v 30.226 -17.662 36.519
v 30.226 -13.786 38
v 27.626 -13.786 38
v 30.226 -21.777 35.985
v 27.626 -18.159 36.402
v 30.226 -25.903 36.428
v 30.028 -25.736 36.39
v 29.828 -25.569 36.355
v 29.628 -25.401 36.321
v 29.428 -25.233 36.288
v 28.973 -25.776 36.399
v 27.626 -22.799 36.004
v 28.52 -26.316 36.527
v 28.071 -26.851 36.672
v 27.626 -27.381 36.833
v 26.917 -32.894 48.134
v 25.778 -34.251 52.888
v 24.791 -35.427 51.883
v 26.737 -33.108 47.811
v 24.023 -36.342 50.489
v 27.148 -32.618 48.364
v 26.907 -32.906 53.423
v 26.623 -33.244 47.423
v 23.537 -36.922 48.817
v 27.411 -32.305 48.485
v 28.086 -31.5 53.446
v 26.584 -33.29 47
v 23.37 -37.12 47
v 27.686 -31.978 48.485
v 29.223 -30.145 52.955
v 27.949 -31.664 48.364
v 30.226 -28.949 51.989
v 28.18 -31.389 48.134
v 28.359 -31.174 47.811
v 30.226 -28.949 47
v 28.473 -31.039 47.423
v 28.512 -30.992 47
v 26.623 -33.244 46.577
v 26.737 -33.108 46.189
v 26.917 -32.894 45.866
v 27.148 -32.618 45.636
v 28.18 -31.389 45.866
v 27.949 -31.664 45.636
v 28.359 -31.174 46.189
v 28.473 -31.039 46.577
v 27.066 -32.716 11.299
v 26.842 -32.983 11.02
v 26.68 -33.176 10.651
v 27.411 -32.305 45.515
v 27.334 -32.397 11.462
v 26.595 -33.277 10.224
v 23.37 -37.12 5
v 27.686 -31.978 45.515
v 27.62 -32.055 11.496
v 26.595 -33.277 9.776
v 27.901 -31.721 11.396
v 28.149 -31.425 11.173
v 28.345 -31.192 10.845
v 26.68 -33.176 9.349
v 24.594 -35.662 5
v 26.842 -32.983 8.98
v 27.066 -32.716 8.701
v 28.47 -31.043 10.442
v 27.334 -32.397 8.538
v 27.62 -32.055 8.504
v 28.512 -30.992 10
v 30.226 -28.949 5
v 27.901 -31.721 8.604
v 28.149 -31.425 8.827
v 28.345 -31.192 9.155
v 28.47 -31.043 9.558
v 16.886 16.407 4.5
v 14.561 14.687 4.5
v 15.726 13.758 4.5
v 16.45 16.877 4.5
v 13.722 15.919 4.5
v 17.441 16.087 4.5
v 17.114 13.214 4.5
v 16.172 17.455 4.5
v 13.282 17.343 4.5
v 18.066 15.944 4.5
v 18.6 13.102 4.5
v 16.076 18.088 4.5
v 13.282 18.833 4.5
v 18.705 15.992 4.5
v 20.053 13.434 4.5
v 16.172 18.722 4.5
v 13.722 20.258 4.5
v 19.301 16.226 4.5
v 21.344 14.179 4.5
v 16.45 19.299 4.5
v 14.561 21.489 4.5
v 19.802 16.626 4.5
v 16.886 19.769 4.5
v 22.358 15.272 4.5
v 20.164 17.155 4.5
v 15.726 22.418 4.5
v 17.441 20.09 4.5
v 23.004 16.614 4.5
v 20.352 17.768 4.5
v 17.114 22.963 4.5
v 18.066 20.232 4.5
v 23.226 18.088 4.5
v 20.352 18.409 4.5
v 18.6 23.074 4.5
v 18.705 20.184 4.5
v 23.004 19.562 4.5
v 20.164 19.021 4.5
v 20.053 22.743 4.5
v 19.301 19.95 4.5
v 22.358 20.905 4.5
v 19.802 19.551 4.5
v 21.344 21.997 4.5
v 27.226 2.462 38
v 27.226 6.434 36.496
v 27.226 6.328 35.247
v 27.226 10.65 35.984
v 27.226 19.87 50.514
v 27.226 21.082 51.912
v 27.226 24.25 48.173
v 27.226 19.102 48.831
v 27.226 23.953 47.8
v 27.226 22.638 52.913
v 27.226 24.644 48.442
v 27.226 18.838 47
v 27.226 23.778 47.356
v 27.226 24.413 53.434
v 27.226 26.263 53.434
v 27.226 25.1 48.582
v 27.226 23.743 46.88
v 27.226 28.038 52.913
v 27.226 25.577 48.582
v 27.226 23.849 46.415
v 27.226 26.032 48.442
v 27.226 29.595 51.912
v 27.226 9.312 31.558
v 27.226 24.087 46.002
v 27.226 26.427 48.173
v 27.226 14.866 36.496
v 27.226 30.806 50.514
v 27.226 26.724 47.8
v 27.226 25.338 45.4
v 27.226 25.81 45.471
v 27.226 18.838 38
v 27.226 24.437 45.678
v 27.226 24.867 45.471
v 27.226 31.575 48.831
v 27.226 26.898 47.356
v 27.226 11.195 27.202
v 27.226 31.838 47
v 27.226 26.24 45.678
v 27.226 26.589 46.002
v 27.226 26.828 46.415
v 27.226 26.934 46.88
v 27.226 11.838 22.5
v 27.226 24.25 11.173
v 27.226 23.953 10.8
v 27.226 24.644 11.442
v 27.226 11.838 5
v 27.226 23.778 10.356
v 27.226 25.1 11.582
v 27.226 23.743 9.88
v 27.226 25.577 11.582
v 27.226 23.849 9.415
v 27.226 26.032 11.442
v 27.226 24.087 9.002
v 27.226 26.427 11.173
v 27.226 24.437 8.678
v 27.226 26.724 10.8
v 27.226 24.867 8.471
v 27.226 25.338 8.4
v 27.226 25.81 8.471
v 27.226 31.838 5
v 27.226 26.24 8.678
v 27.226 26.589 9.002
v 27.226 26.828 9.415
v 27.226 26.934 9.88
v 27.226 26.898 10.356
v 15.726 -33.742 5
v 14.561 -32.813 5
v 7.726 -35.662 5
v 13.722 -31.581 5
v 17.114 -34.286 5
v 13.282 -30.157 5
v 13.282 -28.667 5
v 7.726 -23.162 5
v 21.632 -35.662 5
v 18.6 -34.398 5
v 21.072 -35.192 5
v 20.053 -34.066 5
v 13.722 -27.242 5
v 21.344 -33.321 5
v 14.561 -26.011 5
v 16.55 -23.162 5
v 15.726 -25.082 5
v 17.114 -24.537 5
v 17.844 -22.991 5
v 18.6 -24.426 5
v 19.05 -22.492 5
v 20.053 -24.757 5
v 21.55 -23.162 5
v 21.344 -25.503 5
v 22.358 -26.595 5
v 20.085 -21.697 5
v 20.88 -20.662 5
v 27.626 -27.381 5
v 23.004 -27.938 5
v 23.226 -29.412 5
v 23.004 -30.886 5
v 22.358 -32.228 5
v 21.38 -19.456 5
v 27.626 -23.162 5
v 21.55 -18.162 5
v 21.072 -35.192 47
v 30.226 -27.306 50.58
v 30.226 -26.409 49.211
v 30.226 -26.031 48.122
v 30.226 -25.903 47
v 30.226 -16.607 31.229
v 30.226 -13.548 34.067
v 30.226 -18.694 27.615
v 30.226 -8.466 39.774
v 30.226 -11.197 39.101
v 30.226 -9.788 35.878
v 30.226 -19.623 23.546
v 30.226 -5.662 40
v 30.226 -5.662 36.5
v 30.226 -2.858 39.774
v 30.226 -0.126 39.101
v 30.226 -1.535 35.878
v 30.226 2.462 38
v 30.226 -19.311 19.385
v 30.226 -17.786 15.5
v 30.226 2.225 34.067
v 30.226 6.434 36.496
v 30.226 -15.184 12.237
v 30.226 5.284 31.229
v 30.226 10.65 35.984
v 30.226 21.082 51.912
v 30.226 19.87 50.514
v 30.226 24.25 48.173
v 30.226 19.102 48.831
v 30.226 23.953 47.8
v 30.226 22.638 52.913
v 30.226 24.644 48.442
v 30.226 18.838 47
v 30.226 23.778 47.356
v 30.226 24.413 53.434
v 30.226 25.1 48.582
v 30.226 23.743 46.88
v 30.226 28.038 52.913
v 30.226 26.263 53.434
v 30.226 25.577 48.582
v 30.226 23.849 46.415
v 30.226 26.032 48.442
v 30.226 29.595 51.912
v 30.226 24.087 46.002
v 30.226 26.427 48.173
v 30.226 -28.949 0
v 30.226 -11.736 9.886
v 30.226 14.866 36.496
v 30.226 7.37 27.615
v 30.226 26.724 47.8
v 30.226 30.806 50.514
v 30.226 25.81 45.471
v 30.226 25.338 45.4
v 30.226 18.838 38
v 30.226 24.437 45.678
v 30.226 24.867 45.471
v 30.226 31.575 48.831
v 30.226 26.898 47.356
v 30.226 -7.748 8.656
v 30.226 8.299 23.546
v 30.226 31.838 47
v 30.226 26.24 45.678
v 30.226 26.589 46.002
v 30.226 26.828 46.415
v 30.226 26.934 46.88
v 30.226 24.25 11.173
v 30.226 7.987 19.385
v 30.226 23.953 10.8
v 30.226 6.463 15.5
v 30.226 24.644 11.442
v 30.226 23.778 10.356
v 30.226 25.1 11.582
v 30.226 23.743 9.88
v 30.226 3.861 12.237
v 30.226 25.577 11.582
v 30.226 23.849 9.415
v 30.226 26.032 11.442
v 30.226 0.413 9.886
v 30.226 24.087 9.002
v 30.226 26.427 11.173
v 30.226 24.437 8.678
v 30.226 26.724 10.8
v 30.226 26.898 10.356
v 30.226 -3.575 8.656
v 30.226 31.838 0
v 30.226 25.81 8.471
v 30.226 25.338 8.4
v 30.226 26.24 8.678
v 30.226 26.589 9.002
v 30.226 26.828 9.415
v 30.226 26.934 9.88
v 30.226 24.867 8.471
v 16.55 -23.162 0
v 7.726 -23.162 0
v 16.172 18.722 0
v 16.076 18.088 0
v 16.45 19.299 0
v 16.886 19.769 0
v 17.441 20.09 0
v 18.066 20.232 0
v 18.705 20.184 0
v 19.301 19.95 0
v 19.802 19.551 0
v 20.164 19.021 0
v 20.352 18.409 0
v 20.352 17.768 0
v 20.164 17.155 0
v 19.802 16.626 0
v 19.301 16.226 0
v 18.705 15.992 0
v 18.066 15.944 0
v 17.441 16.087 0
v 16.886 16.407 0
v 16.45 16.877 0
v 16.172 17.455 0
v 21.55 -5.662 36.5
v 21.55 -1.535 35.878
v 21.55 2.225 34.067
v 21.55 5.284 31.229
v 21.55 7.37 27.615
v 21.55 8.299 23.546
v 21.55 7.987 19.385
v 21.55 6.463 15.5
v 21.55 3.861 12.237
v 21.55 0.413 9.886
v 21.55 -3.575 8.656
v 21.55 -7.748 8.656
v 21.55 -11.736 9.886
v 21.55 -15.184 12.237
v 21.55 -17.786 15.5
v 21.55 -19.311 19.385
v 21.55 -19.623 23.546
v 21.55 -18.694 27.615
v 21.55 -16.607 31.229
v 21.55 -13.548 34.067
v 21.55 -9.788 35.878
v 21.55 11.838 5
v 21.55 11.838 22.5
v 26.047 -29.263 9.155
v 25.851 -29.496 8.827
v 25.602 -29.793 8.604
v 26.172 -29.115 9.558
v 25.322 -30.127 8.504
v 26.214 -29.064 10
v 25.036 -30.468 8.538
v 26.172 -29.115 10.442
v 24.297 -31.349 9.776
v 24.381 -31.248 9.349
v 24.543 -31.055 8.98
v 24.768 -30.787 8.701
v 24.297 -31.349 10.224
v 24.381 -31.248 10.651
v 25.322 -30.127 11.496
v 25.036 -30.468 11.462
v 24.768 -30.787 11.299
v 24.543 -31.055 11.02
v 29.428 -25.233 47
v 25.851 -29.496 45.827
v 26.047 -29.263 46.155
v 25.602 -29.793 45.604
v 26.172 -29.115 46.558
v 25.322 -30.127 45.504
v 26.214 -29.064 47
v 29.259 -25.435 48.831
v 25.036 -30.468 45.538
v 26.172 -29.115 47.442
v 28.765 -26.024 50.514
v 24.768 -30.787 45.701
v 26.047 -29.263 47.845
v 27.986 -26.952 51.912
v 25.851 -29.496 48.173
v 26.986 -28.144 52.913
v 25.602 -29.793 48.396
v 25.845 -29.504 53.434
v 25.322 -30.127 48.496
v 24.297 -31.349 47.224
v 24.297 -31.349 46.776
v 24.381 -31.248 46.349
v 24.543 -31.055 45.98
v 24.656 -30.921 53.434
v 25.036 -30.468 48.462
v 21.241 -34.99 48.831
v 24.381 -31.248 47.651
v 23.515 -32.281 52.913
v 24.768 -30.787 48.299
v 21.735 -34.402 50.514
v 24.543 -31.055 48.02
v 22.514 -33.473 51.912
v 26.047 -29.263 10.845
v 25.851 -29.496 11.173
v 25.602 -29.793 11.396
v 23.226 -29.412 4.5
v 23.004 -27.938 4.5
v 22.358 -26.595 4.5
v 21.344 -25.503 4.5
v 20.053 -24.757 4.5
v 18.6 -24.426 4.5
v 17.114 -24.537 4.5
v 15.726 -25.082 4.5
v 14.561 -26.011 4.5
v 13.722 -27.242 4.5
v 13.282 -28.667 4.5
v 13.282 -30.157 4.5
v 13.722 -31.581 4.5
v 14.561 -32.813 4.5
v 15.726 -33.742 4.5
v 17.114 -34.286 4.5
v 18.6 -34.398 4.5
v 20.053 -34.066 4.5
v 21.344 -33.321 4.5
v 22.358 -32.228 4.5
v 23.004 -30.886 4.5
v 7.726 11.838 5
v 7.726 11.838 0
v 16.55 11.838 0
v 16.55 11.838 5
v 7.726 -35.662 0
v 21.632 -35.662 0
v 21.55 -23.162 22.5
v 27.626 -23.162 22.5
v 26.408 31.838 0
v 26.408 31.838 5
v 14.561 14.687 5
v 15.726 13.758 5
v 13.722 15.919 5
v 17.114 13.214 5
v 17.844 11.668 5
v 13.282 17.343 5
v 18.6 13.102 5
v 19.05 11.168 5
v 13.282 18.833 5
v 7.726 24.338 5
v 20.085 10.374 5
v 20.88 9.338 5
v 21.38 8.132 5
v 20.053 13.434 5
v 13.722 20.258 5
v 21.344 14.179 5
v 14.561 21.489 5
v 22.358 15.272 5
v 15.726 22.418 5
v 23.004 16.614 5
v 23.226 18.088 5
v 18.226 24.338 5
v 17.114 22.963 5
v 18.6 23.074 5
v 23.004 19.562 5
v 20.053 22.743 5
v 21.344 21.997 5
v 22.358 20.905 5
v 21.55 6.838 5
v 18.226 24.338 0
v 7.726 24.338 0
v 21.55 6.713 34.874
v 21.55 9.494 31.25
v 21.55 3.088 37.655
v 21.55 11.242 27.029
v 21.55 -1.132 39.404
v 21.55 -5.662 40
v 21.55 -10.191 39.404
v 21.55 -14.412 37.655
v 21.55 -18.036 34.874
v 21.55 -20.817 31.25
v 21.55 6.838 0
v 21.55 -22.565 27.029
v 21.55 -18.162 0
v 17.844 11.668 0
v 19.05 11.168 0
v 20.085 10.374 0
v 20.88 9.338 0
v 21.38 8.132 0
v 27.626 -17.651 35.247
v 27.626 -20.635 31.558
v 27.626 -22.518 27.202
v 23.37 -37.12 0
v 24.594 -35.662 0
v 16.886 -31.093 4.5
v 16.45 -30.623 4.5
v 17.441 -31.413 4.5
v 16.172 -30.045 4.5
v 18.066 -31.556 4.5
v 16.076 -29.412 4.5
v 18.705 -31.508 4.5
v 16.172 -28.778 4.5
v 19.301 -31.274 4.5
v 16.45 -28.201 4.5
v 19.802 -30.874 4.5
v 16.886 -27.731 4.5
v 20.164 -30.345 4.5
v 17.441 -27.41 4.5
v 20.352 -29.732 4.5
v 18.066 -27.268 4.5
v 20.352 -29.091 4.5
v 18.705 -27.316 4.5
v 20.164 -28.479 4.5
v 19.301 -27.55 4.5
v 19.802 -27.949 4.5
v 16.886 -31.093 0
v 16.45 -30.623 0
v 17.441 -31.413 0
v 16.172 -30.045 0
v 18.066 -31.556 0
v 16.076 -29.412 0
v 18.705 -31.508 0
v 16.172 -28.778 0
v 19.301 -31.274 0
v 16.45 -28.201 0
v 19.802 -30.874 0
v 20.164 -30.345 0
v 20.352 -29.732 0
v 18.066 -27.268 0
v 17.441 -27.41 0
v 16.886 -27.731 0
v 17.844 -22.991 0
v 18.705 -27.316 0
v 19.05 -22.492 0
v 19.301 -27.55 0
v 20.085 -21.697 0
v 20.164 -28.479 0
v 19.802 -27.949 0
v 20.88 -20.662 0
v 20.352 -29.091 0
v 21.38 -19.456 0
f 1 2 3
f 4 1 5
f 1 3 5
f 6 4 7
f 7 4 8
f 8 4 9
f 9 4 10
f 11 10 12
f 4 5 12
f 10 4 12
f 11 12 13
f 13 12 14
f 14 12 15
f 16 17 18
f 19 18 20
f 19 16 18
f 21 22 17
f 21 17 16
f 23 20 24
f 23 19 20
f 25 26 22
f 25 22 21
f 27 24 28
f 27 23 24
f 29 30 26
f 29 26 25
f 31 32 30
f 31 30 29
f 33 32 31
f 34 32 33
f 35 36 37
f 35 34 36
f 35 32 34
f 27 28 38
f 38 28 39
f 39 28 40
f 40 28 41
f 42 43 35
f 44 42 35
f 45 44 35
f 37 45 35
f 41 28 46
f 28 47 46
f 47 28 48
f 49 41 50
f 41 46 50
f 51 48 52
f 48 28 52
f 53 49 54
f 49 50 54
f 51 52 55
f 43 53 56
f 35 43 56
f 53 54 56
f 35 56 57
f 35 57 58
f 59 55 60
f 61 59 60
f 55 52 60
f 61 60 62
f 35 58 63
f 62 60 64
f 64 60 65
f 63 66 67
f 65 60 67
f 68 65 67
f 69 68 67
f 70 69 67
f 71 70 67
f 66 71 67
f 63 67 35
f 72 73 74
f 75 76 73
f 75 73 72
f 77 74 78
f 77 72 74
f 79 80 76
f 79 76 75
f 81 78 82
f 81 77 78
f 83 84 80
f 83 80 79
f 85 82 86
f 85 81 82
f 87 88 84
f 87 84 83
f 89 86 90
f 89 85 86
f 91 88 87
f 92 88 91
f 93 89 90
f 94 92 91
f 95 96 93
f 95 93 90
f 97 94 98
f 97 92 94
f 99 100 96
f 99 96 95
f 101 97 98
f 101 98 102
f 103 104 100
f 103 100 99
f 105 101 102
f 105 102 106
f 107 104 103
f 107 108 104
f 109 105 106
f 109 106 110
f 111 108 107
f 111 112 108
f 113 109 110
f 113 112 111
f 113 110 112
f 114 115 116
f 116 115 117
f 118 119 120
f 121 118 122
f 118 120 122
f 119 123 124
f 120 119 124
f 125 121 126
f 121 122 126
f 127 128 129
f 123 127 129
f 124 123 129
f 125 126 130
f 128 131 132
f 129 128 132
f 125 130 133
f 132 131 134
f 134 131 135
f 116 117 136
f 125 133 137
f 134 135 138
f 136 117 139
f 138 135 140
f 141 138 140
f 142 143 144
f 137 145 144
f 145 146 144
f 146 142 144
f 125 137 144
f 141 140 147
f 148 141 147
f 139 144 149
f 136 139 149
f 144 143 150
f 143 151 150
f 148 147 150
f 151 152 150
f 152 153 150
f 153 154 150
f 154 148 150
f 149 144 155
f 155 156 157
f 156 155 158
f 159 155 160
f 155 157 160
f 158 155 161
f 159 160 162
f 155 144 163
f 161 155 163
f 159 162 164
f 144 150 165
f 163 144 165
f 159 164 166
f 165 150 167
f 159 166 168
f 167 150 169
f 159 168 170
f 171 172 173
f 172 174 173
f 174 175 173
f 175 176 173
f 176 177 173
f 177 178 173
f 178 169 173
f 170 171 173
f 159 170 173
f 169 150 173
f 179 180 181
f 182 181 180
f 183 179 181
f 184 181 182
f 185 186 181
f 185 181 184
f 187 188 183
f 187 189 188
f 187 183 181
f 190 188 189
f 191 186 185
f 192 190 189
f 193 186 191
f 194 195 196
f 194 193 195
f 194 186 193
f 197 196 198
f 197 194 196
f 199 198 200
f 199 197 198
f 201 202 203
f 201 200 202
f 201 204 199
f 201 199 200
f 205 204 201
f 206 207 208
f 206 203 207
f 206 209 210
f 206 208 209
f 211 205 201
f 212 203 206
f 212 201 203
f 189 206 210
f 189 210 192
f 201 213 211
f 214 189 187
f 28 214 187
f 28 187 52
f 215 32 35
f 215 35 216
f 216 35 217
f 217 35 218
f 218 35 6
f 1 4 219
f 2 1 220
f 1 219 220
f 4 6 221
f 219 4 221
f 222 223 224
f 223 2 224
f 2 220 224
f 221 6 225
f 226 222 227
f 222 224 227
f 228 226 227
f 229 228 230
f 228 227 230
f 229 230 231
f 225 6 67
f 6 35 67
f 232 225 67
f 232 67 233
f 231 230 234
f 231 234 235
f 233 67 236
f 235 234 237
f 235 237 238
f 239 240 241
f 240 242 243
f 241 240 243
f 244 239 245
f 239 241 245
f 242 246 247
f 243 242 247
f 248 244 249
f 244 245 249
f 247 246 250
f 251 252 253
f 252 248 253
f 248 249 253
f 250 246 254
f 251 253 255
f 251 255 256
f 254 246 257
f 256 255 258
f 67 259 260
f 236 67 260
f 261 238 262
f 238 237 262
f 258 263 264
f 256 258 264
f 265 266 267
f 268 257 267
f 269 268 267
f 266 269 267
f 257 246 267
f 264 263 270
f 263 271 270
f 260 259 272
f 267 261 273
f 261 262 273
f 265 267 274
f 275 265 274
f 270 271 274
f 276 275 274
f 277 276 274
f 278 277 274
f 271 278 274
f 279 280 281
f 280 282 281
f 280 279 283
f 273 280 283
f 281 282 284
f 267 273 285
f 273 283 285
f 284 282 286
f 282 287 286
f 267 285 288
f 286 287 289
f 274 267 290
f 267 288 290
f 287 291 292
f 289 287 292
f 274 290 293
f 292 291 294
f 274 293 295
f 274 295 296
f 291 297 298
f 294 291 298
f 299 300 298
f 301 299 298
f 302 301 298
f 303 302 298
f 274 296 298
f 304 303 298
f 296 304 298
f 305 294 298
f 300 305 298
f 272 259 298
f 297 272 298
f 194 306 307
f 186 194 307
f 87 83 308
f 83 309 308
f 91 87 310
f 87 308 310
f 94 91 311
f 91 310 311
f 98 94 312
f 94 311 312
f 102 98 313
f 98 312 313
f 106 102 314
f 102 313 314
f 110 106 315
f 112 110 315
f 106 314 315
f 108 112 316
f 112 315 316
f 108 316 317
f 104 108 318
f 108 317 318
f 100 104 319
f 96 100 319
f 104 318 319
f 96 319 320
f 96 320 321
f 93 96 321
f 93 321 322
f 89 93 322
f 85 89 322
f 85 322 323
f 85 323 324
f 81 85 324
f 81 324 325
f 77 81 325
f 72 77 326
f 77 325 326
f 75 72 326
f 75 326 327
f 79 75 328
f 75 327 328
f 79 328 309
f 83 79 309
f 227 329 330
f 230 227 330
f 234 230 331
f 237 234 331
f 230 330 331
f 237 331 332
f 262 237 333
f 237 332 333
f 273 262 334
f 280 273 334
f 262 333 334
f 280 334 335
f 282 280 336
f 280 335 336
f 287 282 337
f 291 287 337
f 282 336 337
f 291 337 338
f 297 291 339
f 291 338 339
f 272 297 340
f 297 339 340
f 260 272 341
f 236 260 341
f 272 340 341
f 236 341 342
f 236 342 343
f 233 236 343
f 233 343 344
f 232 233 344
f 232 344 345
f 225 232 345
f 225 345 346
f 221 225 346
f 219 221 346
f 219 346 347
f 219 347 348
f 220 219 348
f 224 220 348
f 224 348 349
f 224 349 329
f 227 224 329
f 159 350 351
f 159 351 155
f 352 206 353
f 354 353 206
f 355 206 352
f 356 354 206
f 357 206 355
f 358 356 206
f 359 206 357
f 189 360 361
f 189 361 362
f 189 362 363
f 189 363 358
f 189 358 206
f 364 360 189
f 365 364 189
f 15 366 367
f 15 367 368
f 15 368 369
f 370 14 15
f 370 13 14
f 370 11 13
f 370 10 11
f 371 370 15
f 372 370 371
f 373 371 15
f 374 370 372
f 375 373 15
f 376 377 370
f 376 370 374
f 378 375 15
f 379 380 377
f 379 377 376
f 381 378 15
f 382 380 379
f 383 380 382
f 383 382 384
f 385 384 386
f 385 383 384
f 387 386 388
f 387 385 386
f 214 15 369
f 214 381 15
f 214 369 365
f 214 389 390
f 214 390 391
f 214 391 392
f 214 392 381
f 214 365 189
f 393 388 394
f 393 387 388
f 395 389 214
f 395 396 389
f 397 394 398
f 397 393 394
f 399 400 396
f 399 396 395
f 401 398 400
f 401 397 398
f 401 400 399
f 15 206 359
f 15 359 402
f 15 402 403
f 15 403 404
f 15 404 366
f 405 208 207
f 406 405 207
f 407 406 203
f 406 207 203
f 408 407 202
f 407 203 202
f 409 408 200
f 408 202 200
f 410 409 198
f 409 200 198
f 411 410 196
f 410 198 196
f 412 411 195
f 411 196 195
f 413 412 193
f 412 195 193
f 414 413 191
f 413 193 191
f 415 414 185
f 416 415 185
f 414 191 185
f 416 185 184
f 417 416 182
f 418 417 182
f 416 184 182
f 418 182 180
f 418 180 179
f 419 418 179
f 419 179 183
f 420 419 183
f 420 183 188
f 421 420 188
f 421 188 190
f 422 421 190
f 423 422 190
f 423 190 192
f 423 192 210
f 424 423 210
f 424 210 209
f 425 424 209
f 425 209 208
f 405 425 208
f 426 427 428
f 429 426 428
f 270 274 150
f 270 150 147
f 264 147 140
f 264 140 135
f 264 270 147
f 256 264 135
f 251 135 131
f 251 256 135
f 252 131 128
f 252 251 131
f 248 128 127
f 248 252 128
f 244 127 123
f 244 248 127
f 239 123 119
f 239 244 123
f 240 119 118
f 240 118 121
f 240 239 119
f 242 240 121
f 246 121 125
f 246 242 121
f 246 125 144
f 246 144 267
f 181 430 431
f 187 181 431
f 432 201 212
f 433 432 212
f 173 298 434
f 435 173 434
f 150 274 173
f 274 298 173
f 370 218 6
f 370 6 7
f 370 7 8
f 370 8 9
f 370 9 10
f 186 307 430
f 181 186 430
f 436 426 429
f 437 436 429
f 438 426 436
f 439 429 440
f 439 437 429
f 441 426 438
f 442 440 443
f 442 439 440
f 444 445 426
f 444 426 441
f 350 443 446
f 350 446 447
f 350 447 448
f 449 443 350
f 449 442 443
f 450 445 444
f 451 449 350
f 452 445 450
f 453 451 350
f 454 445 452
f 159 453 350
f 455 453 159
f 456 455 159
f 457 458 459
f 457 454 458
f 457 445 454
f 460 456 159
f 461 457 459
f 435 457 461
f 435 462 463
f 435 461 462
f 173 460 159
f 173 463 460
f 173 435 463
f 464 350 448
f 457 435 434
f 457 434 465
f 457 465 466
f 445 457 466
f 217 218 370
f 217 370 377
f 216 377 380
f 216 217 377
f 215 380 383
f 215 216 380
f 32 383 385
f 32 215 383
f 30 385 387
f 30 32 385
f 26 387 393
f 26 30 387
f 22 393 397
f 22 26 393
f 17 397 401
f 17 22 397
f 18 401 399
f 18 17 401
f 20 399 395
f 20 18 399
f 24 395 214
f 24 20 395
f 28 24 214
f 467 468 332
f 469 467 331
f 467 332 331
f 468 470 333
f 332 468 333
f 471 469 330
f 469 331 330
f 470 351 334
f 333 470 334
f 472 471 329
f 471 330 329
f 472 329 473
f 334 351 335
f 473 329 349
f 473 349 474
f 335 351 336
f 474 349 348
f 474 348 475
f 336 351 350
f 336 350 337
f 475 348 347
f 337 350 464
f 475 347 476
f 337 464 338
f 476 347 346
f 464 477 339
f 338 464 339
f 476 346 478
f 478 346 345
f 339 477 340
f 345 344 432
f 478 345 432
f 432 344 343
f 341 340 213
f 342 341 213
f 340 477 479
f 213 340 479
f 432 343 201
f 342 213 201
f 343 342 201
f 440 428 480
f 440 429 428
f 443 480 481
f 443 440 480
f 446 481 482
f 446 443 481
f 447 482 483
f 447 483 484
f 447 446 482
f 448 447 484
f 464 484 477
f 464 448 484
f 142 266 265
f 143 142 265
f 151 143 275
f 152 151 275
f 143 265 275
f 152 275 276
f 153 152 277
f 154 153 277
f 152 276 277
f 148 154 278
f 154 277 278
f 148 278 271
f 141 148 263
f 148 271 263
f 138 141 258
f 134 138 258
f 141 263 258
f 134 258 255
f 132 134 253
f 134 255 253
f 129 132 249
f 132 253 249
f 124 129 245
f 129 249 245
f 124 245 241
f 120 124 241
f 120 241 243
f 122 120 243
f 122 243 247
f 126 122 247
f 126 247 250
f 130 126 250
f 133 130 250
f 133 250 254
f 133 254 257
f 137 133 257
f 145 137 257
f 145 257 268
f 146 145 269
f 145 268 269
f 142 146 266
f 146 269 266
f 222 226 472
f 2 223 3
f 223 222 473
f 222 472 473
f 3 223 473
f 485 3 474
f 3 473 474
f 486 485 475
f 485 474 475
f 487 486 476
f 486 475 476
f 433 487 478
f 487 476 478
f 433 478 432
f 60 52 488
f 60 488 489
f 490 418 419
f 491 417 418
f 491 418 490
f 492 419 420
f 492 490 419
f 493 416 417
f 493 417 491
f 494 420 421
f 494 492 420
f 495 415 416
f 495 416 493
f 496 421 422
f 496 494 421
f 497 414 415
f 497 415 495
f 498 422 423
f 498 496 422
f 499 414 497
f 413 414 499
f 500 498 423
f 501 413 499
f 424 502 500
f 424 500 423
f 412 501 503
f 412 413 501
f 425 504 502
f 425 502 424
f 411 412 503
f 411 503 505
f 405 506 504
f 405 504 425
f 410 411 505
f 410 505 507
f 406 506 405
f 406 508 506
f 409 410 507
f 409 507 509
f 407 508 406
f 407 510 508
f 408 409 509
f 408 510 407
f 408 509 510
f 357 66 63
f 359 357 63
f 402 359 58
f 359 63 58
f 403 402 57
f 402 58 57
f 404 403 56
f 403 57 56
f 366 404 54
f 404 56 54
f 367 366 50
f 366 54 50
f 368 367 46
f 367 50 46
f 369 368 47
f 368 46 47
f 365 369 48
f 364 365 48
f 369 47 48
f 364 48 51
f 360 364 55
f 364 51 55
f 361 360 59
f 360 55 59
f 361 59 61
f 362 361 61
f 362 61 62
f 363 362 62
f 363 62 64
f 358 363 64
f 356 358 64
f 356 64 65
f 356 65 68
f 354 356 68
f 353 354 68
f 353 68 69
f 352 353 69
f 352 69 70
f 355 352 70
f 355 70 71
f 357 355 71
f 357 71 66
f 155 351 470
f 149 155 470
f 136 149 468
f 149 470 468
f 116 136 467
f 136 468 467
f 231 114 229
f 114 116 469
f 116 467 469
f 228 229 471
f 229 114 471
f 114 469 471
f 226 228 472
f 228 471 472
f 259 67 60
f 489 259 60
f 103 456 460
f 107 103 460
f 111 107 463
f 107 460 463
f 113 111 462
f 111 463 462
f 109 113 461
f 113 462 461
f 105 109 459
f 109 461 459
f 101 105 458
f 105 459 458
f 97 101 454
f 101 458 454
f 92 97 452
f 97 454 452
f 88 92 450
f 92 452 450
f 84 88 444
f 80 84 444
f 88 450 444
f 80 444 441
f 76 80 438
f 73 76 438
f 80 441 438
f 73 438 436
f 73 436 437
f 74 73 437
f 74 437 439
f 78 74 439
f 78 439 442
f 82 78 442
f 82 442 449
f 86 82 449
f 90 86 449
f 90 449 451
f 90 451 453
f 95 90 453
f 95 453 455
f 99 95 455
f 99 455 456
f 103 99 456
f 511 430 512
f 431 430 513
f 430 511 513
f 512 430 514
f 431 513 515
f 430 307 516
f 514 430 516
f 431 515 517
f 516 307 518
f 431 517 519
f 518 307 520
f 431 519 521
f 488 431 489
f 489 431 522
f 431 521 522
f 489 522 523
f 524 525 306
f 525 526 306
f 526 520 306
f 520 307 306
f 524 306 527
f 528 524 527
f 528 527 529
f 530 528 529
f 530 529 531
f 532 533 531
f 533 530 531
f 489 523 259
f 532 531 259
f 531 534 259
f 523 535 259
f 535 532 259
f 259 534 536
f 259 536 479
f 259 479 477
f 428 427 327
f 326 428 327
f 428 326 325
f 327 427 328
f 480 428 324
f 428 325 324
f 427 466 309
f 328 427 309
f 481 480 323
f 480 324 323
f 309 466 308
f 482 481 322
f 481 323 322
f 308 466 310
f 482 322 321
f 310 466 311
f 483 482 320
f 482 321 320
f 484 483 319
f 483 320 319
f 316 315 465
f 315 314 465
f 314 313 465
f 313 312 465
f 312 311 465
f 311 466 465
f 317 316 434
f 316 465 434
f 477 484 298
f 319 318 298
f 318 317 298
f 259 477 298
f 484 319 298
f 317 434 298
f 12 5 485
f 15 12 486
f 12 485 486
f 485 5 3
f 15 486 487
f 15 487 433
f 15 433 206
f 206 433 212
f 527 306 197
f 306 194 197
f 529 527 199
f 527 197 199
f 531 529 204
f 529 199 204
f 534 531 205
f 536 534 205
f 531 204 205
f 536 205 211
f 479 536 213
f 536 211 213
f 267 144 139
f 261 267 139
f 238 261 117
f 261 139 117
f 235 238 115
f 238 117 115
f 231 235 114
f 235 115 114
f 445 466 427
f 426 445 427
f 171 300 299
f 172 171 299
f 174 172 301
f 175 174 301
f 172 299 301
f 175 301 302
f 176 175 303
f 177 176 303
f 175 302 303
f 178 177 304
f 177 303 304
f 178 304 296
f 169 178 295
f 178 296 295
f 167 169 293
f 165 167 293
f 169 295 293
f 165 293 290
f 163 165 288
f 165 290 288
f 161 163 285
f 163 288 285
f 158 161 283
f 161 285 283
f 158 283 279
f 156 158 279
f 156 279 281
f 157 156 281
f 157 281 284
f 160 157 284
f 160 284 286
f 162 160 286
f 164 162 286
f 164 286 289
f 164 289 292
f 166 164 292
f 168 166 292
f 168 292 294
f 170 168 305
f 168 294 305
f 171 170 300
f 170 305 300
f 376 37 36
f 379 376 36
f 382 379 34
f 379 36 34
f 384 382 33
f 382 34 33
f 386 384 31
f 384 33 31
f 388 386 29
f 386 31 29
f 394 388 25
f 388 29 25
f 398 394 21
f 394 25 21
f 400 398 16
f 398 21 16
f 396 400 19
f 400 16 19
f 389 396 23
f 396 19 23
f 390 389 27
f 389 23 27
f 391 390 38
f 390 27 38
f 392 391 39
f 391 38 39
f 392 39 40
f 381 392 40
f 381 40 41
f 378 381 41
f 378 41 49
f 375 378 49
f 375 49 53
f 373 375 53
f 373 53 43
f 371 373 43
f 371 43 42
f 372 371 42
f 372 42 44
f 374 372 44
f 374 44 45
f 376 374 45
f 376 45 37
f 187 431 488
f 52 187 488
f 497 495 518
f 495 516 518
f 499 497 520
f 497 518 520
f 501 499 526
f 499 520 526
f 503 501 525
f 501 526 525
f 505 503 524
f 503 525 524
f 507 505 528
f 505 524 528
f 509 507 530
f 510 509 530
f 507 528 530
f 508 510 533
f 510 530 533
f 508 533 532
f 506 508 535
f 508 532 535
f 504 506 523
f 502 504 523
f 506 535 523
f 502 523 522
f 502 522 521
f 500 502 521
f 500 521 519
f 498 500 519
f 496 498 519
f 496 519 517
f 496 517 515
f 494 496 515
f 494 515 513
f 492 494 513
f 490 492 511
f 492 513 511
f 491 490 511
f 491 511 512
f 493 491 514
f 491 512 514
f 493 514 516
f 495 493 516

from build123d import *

# Parameters (mm, degrees)
EXTRUDE_2_DEPTH                = 5
SKETCH_4_W                     = 8.676470589
SKETCH_4_H                     = 35
SKETCH_4_W_2                   = 8.676470588
EXTRUDE_15_DEPTH               = 35
CUT_EXTRUDE_1_DEPTH            = 45
SKETCH_6_R                     = 14
CUT_EXTRUDE_2_DEPTH            = 45
FILLET_1_R                     = 5
SKETCH_7_R                     = 15
SKETCH_7_R_2                   = 13
EXTRUDE_16_DEPTH               = 1
SPLIT_BODIES_1_SURFACE_1_BACK  = 86
SPLIT_BODIES_1_SURFACE_1_DEPTH = 172
SPLIT_BODIES_1_SURFACE_2_BACK  = 86
SPLIT_BODIES_1_SURFACE_2_DEPTH = 172
HOLE_WIZARD_1_D                = 4.3
HOLE_WIZARD_1_DEPTH            = 5
HOLE_WIZARD_1_CBORE_D          = 10
HOLE_WIZARD_1_CBORE_DEPTH      = 0.5
HOLE_WIZARD_1_TIP              = 1.291850331
SKETCH_17_W                    = 3
SKETCH_17_H                    = 13
EXTRUDE_20_DEPTH               = 42
EXTRUDE_21_DEPTH               = 3
SKETCH_19_R                    = 1.6
CUT_EXTRUDE_3_DEPTH            = 3
EXTRUDE_START                  = -3
EXTRUDE_25_DEPTH               = 3
EXTRUDE_22_DEPTH               = 5
EXTRUDE_26_DEPTH               = 42
EXTRUDE_START_2                = -2.6
EXTRUDE_27_DEPTH               = 2.6
CUT_EXTRUDE_5_DEPTH            = 22.6
EXTRUDE_29_REACH               = 85.035
SKETCH_42_R                    = 1.5
CUT_EXTRUDE_6_DEPTH            = 84.034846606
CUT_EXTRUDE_7_DEPTH            = 8.6
EXTRUDE_31_DEPTH               = 5


with BuildPart() as part:
    # 草图2 → 凸台-拉伸2 (new body)
    with BuildSketch(Plane.XY):
        Polygon((7.726423565, 24.338235294), (-14.773576435, 24.338235294), (-14.773576435, -35.661764706), (7.726423565, -35.661764706), (7.726423565, -23.161764706), (-6.097105846, -23.161764706), (-6.097105846, 11.838235294), (7.726423565, 11.838235294), align=None)
        Polygon((30.226423565, 24.338235294), (7.726423565, 24.338235294), (7.726423565, 11.838235294), (21.549952977, 11.838235294), (21.549952977, -23.161764706), (7.726423565, -23.161764706), (7.726423565, -35.661764706), (30.226423565, -35.661764706), align=None)
    extrude(amount=EXTRUDE_2_DEPTH)

    # 草图4 → 凸台-拉伸15 (add)
    with BuildSketch(Plane.XY.offset(5)):
        with Locations((-10.435341141, -5.661764706)):
            Rectangle(SKETCH_4_W, SKETCH_4_H)
        with Locations((25.888188271, -5.661764706)):
            Rectangle(SKETCH_4_W_2, SKETCH_4_H)
    extrude(amount=EXTRUDE_15_DEPTH)

    # 草图5 → 切除-拉伸1 (cut)
    with BuildSketch(Plane.ZY.offset(14.773576435)):
        with BuildLine():
            Line((40, -23.161764706), (40, -5.661764706))
            ThreePointArc((40, -5.661764706), (34.874368671, -18.036133377), (22.5, -23.161764706))
            Line((22.5, -23.161764706), (40, -23.161764706))
        make_face()
        with BuildLine():
            ThreePointArc((22.5, 11.838235294), (34.874368671, 6.712603965), (40, -5.661764706))
            Line((40, -5.661764706), (40, 11.838235294))
            Line((40, 11.838235294), (22.5, 11.838235294))
        make_face()
    extrude(amount=-CUT_EXTRUDE_1_DEPTH, mode=Mode.SUBTRACT)

    # 草图6 → 切除-拉伸2 (cut)
    with BuildSketch(Plane.ZY.offset(14.773576435)):
        with Locations((22.5, -5.661764706)):
            Circle(SKETCH_6_R)
    extrude(amount=-CUT_EXTRUDE_2_DEPTH, mode=Mode.SUBTRACT)

    # 圆角1
    fillet_1_edges = [part.edges().sort_by_distance(p)[0] for p in [
        (-6.097105846, 11.838235294, 2.5),
        (-6.097105846, -23.161764706, 2.5),
        (21.549952977, -23.161764706, 2.5),
        (21.549952977, 11.838235294, 2.5),
    ]]
    fillet(fillet_1_edges, radius=FILLET_1_R)

    # 草图7 → 凸台-拉伸16 (add)
    with BuildSketch(Plane(origin=(-6.097105846, 0, 0), x_dir=(0, 0, -1), z_dir=(1, 0, 0))):
        with Locations((-22.5, -5.661764706)):
            Circle(SKETCH_7_R)
        with Locations((-22.5, -5.661764706)):
            Circle(SKETCH_7_R_2, mode=Mode.SUBTRACT)
    extrude(amount=-EXTRUDE_16_DEPTH)


with BuildPart() as body_2:
    # Split Bodies 1: the piece behind the surface
    add(part.part)
    # Split Bodies 1 surface: a surface, the sketch's curves swept straight by 172 mm
    with BuildLine(Plane.XY.offset(5).offset(-SPLIT_BODIES_1_SURFACE_1_BACK), mode=Mode.PRIVATE) as split_bodies_1_surface_1_path:
        Line((7.726423565, 24.338235294), (7.726423565, -35.661764706))
    split_bodies_1_surface_1 = Shell.extrude(split_bodies_1_surface_1_path.wire(), (0 * SPLIT_BODIES_1_SURFACE_1_DEPTH, 0 * SPLIT_BODIES_1_SURFACE_1_DEPTH, 1 * SPLIT_BODIES_1_SURFACE_1_DEPTH))
    split(bisect_by=split_bodies_1_surface_1, keep=Keep.BOTTOM)


with BuildPart() as part_1:
    add(part.part)

    # Split Bodies 1: split by a surface, the side it looks to stays
    # Split Bodies 1 surface: a surface, the sketch's curves swept straight by 172 mm
    with BuildLine(Plane.XY.offset(5).offset(-SPLIT_BODIES_1_SURFACE_2_BACK), mode=Mode.PRIVATE) as split_bodies_1_surface_2_path:
        Line((7.726423565, 24.338235294), (7.726423565, -35.661764706))
    split_bodies_1_surface_2 = Shell.extrude(split_bodies_1_surface_2_path.wire(), (0 * SPLIT_BODIES_1_SURFACE_2_DEPTH, 0 * SPLIT_BODIES_1_SURFACE_2_DEPTH, 1 * SPLIT_BODIES_1_SURFACE_2_DEPTH))
    split(bisect_by=split_bodies_1_surface_2, keep=Keep.TOP)

    # 打孔尺寸(%根据六角头螺)栓 全螺纹的类型1
    with Locations(Plane(origin=(18.226423565, 18.088235294, 5), x_dir=(1, 0, 0), z_dir=(0, 0, 1))):
        with Locations((0, 0), (0, -47.5)):
            CounterBoreHole(HOLE_WIZARD_1_D / 2, HOLE_WIZARD_1_CBORE_D / 2, HOLE_WIZARD_1_CBORE_DEPTH, depth=HOLE_WIZARD_1_DEPTH)
            with Locations((0, 0, -(HOLE_WIZARD_1_DEPTH + HOLE_WIZARD_1_TIP / 2))):  # 118° drill point
                Cone(0, HOLE_WIZARD_1_D / 2, HOLE_WIZARD_1_TIP, mode=Mode.SUBTRACT)

    # 草图17 → 凸台-拉伸20 (add)
    with BuildSketch(Plane.XY.offset(5)):
        with Locations((28.726423565, 25.338235294)):
            Rectangle(SKETCH_17_W, SKETCH_17_H)
    extrude(amount=EXTRUDE_20_DEPTH)

    # 草图18 → 凸台-拉伸21 (add)
    with BuildSketch(Plane(origin=(30.226423565, 0, 0), x_dir=(0, 0, -1), z_dir=(1, 0, 0))):
        with BuildLine():
            Line((-47, 18.838235294), (-47, 31.838235294))
            ThreePointArc((-47, 31.838235294), (-53.5, 25.338235294), (-47, 18.838235294))
        make_face()
    extrude(amount=-EXTRUDE_21_DEPTH)

    # 草图19 → 切除-拉伸3 (cut)
    with BuildSketch(Plane(origin=(30.226423565, 0, 0), x_dir=(0, 0, -1), z_dir=(1, 0, 0))):
        with Locations((-47, 25.338235294)):
            Circle(SKETCH_19_R)
        with Locations((-10, 25.338235294)):
            Circle(SKETCH_19_R)
    extrude(amount=-CUT_EXTRUDE_3_DEPTH, mode=Mode.SUBTRACT)

    # 草图24 → 凸台-拉伸25 (add)
    with BuildSketch(Plane(origin=(30.226423565, 0, 0), x_dir=(0, 0, -1), z_dir=(1, 0, 0)).offset(EXTRUDE_START)):
        with BuildLine():
            Line((-5, 18.838235294), (-38, 18.838235294))
            ThreePointArc((-38, 18.838235294), (-35.984258471, 10.650254496), (-38, 2.462273699))
            ThreePointArc((-38, 2.462273699), (-31.557574949, 9.311890026), (-22.5, 11.838235294))
            Line((-22.5, 11.838235294), (-5, 11.838235294))
            Line((-5, 11.838235294), (-5, 18.838235294))
        make_face()
    extrude(amount=EXTRUDE_25_DEPTH)

    # 草图21 → 凸台-拉伸22 (add)
    with BuildSketch(Plane.XY.offset(5)):
        Polygon((18.226423565, 24.338235294), (30.226423565, 24.338235294), (30.226423565, 31.838235294), (26.408241747, 31.838235294), align=None)
    extrude(amount=-EXTRUDE_22_DEPTH)

    # 草图34 → 凸台-拉伸26 (add)
    with BuildSketch(Plane.XY.offset(5)):
        Polygon((21.07205131, -35.191979637), (23.370184639, -37.120342466), (30.226423565, -28.949395095), (30.226423565, -25.903115259), (29.428290236, -25.233401877), align=None)
    extrude(amount=EXTRUDE_26_DEPTH)

    # 草图37 → 凸台-拉伸27 (add)
    with BuildSketch(Plane(origin=(30.226423565, 0, 0), x_dir=(0, 0, -1), z_dir=(1, 0, 0)).offset(EXTRUDE_START_2)):
        with BuildLine():
            Line((-37.42228501, -28.949395095), (-5, -28.949395095))
            Line((-5, -28.949395095), (-5, -23.161764706))
            Line((-5, -23.161764706), (-22.5, -23.161764706))
            ThreePointArc((-22.5, -23.161764706), (-31.557574949, -20.635419438), (-38, -13.785803111))
            ThreePointArc((-38, -13.785803111), (-35.997045319, -21.302294019), (-37.42228501, -28.949395095))
        make_face()
    extrude(amount=EXTRUDE_27_DEPTH)

    # 草图38 → 切除-拉伸5 (cut)
    with BuildSketch(Plane.XY.offset(5)):
        Polygon((30.226423565, -35.661764706), (30.226423565, -28.949395095), (24.5940767, -35.661764706), align=None)
    extrude(amount=-CUT_EXTRUDE_5_DEPTH, mode=Mode.SUBTRACT)

    # 凸台-拉伸29: up to this face of the body (flat: up to its plane)
    extrude_29_end = Plane(part_1.part.faces().sort_by_distance((24.617542998, -30.966627181, 27.010629393))[0])
    # 草图41 → 凸台-拉伸29 (add, up to the picked face)
    with BuildSketch(Plane(origin=(31.992387835, -26.844800832, 0), x_dir=(0, 0, -1), z_dir=(0.7660444431189818, -0.6427876096865348, 0)), mode=Mode.PRIVATE) as extrude_29_sk1:
        with BuildLine():
            Line((-47, -13.413766951), (-47, -0.413766951))
            ThreePointArc((-47, -0.413766951), (-53.5, -6.913766951), (-47, -13.413766951))
        make_face()
    extrude_29_tool1 = split(extrude(extrude_29_sk1.sketch, amount=-EXTRUDE_29_REACH, mode=Mode.PRIVATE), bisect_by=extrude_29_end, keep=Keep.BOTH, mode=Mode.PRIVATE)
    add(extrude_29_tool1.solids().sort_by(Axis((27.548304, -32.141054, 49.758686), (-0.7660444431189818, 0.6427876096865348, 0)))[0])

    # 草图42 → 切除-拉伸6 (cut, through all)
    with BuildSketch(Plane(origin=(31.992387835, -26.844800832, 0), x_dir=(0, 0, -1), z_dir=(0.7660444431189818, -0.6427876096865348, 0))):
        with Locations(Location((-47, -6.913766951, 0), (0, 0, 90))):
            Circle(SKETCH_42_R)
        with Locations(Location((-10, -6.913766951, 0), (0, 0, 90))):
            Circle(SKETCH_42_R)
    extrude(amount=-CUT_EXTRUDE_6_DEPTH, mode=Mode.SUBTRACT)

    # 草图44 → 切除-拉伸7 (cut)
    with BuildSketch(Plane(origin=(0, 0, 47), x_dir=(-1, 0, 0), z_dir=(0, 0, -1))):
        Polygon((-31.726423565, -27.161764706), (-30.226423565, -28.949395095), (-30.226423565, -25.903115259), align=None)
    extrude(amount=-CUT_EXTRUDE_7_DEPTH, mode=Mode.SUBTRACT)

    # 草图39 → 凸台-拉伸31 (add)
    with BuildSketch(Plane.XY.offset(5)):
        Polygon((24.5940767, -35.661764706), (21.631919353, -35.661764706), (23.370184639, -37.120342466), align=None)
    extrude(amount=-EXTRUDE_31_DEPTH)


solid = part_1.part
